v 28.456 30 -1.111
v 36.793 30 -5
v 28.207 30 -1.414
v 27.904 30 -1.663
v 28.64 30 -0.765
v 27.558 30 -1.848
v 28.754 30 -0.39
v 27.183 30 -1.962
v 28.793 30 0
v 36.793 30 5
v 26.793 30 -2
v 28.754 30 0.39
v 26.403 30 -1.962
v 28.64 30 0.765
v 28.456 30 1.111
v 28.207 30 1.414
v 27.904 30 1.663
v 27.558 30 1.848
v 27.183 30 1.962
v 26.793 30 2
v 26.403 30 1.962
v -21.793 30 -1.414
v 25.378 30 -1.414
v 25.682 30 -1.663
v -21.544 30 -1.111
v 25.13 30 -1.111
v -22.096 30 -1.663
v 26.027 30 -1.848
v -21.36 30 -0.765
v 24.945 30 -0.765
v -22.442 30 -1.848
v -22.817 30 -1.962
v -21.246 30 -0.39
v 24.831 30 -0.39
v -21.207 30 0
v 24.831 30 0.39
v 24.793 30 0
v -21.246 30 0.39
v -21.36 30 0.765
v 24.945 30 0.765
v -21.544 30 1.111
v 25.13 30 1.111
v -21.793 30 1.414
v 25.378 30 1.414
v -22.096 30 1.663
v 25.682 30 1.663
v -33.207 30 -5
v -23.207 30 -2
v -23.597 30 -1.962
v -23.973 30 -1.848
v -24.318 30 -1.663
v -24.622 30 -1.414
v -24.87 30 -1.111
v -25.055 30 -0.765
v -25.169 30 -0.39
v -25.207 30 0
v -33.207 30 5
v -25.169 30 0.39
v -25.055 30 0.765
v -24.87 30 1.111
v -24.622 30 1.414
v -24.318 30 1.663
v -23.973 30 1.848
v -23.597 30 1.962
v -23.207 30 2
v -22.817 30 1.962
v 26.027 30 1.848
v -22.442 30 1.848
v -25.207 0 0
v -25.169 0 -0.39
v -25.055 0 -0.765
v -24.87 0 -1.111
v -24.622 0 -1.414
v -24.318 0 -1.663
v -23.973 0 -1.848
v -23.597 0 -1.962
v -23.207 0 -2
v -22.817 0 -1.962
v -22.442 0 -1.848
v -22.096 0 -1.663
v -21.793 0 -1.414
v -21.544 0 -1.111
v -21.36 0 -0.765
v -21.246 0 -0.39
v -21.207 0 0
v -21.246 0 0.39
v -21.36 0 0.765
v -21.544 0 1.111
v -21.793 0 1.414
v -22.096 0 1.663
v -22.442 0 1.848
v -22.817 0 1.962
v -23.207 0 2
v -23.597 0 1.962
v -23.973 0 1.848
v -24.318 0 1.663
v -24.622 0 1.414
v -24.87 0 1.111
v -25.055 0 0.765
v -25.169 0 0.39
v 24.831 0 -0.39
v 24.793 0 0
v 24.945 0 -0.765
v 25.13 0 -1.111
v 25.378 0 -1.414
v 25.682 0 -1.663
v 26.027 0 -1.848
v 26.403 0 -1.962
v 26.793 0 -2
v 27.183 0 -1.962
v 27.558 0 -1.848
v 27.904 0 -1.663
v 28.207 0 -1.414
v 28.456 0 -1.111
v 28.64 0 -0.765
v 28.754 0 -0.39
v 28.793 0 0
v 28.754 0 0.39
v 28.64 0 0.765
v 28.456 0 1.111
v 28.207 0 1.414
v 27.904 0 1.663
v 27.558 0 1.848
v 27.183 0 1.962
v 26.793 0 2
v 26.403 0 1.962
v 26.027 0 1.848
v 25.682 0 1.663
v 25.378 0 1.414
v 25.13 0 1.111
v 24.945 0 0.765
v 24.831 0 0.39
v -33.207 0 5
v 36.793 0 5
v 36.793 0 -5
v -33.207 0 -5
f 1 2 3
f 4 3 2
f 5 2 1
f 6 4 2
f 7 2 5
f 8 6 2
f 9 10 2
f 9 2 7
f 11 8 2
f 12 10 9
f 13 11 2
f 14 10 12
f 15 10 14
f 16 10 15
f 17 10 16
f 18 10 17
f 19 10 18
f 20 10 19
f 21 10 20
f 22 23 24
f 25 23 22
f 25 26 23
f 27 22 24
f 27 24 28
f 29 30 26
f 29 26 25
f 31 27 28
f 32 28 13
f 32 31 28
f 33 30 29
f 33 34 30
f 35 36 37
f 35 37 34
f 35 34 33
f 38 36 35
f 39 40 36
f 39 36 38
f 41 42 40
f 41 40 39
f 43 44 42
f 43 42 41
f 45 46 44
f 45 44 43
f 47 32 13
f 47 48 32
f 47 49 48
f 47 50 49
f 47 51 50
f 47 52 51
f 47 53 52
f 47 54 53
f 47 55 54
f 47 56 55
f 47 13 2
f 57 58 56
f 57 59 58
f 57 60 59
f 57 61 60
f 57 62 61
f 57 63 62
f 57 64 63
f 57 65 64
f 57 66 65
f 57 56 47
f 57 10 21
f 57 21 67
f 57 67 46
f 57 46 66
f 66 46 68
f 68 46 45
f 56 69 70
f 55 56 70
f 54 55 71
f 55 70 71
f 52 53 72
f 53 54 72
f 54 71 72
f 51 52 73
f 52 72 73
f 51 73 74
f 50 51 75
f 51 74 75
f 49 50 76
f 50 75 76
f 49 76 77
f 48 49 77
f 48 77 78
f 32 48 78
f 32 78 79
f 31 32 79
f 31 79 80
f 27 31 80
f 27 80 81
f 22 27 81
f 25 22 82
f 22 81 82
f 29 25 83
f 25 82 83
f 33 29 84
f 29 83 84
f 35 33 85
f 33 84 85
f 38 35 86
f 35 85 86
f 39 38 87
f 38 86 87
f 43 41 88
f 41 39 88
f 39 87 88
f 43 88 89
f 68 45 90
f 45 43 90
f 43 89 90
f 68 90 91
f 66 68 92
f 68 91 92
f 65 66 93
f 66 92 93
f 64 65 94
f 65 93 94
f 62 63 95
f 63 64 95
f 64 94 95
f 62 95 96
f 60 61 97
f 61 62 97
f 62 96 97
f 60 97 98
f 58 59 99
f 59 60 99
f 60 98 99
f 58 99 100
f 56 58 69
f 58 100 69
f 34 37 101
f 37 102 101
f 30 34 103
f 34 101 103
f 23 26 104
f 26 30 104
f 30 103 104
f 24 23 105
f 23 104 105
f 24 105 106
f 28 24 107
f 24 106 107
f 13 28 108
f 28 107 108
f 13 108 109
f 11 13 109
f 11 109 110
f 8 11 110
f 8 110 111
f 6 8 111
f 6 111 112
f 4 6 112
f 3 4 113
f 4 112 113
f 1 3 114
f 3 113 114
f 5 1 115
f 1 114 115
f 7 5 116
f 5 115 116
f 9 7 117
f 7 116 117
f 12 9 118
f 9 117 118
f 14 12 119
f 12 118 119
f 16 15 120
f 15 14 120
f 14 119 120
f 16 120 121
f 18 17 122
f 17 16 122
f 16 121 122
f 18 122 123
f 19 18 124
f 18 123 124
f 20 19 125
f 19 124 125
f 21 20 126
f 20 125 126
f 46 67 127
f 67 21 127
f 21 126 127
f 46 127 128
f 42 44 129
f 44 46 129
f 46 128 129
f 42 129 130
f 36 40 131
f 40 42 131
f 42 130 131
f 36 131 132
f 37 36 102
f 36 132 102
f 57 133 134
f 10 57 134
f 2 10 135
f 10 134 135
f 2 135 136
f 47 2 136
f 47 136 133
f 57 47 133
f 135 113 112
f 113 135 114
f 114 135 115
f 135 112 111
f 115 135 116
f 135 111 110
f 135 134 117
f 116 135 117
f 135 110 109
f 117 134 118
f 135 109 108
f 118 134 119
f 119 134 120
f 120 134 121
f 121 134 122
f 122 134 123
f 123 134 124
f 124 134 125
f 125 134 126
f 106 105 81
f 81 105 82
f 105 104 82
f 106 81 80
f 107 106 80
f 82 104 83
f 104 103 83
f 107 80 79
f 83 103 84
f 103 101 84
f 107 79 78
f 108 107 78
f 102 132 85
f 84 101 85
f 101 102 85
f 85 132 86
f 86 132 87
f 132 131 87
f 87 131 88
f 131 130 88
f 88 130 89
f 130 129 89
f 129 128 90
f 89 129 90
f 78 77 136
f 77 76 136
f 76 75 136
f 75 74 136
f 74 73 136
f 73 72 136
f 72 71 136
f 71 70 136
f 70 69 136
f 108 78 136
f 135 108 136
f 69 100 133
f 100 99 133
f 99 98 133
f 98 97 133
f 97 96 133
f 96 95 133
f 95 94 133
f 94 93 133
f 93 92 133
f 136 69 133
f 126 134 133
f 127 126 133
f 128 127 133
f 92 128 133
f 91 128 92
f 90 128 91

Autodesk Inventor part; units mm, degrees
ref_plane "YZ Plane" through (0, 0, 0) normal (1, 0, 0) x (0, 1, 0)
ref_plane "XZ Plane" through (0, 0, 0) normal (0, 1, 0) x (-1, 0, 0)
ref_plane "XY Plane" through (0, 0, 0) normal (0, 0, 1) x (1, 0, 0)
sketch "Sketch1" plane through (0, 0, 0) normal (0, 1, 0) x (-1, 0, 0)
  line L0 (33.2073, 5) -> (-36.7927, 5)
  line L1 (-36.7927, 5) -> (-36.7927, -5)
  line L2 (-36.7927, -5) -> (33.2073, -5)
  line L3 (33.2073, -5) -> (33.2073, 5)
  line L4 (33.2073, 5) -> (-36.7927, -5) construction
  line L5 (-36.7927, 5) -> (33.2073, -5) construction
  circle A0 centre (23.2073, 0) radius 2
  circle A1 centre (-26.7927, 0) radius 2
  point P0 (-1.7927, 0)
  point P1 (-1.7927, -5)
  dimension "d0" = 10
  dimension "d4" = 70
  dimension "d5" = 4
  dimension "d6" = 4
  dimension "d7" = 10
  dimension "d8" = 10
  dimension "d9" = 50
extrude "Extrusion1" add sketch "Sketch1" along normal blind 30
properties part number "Schiebegewicht Wand"
